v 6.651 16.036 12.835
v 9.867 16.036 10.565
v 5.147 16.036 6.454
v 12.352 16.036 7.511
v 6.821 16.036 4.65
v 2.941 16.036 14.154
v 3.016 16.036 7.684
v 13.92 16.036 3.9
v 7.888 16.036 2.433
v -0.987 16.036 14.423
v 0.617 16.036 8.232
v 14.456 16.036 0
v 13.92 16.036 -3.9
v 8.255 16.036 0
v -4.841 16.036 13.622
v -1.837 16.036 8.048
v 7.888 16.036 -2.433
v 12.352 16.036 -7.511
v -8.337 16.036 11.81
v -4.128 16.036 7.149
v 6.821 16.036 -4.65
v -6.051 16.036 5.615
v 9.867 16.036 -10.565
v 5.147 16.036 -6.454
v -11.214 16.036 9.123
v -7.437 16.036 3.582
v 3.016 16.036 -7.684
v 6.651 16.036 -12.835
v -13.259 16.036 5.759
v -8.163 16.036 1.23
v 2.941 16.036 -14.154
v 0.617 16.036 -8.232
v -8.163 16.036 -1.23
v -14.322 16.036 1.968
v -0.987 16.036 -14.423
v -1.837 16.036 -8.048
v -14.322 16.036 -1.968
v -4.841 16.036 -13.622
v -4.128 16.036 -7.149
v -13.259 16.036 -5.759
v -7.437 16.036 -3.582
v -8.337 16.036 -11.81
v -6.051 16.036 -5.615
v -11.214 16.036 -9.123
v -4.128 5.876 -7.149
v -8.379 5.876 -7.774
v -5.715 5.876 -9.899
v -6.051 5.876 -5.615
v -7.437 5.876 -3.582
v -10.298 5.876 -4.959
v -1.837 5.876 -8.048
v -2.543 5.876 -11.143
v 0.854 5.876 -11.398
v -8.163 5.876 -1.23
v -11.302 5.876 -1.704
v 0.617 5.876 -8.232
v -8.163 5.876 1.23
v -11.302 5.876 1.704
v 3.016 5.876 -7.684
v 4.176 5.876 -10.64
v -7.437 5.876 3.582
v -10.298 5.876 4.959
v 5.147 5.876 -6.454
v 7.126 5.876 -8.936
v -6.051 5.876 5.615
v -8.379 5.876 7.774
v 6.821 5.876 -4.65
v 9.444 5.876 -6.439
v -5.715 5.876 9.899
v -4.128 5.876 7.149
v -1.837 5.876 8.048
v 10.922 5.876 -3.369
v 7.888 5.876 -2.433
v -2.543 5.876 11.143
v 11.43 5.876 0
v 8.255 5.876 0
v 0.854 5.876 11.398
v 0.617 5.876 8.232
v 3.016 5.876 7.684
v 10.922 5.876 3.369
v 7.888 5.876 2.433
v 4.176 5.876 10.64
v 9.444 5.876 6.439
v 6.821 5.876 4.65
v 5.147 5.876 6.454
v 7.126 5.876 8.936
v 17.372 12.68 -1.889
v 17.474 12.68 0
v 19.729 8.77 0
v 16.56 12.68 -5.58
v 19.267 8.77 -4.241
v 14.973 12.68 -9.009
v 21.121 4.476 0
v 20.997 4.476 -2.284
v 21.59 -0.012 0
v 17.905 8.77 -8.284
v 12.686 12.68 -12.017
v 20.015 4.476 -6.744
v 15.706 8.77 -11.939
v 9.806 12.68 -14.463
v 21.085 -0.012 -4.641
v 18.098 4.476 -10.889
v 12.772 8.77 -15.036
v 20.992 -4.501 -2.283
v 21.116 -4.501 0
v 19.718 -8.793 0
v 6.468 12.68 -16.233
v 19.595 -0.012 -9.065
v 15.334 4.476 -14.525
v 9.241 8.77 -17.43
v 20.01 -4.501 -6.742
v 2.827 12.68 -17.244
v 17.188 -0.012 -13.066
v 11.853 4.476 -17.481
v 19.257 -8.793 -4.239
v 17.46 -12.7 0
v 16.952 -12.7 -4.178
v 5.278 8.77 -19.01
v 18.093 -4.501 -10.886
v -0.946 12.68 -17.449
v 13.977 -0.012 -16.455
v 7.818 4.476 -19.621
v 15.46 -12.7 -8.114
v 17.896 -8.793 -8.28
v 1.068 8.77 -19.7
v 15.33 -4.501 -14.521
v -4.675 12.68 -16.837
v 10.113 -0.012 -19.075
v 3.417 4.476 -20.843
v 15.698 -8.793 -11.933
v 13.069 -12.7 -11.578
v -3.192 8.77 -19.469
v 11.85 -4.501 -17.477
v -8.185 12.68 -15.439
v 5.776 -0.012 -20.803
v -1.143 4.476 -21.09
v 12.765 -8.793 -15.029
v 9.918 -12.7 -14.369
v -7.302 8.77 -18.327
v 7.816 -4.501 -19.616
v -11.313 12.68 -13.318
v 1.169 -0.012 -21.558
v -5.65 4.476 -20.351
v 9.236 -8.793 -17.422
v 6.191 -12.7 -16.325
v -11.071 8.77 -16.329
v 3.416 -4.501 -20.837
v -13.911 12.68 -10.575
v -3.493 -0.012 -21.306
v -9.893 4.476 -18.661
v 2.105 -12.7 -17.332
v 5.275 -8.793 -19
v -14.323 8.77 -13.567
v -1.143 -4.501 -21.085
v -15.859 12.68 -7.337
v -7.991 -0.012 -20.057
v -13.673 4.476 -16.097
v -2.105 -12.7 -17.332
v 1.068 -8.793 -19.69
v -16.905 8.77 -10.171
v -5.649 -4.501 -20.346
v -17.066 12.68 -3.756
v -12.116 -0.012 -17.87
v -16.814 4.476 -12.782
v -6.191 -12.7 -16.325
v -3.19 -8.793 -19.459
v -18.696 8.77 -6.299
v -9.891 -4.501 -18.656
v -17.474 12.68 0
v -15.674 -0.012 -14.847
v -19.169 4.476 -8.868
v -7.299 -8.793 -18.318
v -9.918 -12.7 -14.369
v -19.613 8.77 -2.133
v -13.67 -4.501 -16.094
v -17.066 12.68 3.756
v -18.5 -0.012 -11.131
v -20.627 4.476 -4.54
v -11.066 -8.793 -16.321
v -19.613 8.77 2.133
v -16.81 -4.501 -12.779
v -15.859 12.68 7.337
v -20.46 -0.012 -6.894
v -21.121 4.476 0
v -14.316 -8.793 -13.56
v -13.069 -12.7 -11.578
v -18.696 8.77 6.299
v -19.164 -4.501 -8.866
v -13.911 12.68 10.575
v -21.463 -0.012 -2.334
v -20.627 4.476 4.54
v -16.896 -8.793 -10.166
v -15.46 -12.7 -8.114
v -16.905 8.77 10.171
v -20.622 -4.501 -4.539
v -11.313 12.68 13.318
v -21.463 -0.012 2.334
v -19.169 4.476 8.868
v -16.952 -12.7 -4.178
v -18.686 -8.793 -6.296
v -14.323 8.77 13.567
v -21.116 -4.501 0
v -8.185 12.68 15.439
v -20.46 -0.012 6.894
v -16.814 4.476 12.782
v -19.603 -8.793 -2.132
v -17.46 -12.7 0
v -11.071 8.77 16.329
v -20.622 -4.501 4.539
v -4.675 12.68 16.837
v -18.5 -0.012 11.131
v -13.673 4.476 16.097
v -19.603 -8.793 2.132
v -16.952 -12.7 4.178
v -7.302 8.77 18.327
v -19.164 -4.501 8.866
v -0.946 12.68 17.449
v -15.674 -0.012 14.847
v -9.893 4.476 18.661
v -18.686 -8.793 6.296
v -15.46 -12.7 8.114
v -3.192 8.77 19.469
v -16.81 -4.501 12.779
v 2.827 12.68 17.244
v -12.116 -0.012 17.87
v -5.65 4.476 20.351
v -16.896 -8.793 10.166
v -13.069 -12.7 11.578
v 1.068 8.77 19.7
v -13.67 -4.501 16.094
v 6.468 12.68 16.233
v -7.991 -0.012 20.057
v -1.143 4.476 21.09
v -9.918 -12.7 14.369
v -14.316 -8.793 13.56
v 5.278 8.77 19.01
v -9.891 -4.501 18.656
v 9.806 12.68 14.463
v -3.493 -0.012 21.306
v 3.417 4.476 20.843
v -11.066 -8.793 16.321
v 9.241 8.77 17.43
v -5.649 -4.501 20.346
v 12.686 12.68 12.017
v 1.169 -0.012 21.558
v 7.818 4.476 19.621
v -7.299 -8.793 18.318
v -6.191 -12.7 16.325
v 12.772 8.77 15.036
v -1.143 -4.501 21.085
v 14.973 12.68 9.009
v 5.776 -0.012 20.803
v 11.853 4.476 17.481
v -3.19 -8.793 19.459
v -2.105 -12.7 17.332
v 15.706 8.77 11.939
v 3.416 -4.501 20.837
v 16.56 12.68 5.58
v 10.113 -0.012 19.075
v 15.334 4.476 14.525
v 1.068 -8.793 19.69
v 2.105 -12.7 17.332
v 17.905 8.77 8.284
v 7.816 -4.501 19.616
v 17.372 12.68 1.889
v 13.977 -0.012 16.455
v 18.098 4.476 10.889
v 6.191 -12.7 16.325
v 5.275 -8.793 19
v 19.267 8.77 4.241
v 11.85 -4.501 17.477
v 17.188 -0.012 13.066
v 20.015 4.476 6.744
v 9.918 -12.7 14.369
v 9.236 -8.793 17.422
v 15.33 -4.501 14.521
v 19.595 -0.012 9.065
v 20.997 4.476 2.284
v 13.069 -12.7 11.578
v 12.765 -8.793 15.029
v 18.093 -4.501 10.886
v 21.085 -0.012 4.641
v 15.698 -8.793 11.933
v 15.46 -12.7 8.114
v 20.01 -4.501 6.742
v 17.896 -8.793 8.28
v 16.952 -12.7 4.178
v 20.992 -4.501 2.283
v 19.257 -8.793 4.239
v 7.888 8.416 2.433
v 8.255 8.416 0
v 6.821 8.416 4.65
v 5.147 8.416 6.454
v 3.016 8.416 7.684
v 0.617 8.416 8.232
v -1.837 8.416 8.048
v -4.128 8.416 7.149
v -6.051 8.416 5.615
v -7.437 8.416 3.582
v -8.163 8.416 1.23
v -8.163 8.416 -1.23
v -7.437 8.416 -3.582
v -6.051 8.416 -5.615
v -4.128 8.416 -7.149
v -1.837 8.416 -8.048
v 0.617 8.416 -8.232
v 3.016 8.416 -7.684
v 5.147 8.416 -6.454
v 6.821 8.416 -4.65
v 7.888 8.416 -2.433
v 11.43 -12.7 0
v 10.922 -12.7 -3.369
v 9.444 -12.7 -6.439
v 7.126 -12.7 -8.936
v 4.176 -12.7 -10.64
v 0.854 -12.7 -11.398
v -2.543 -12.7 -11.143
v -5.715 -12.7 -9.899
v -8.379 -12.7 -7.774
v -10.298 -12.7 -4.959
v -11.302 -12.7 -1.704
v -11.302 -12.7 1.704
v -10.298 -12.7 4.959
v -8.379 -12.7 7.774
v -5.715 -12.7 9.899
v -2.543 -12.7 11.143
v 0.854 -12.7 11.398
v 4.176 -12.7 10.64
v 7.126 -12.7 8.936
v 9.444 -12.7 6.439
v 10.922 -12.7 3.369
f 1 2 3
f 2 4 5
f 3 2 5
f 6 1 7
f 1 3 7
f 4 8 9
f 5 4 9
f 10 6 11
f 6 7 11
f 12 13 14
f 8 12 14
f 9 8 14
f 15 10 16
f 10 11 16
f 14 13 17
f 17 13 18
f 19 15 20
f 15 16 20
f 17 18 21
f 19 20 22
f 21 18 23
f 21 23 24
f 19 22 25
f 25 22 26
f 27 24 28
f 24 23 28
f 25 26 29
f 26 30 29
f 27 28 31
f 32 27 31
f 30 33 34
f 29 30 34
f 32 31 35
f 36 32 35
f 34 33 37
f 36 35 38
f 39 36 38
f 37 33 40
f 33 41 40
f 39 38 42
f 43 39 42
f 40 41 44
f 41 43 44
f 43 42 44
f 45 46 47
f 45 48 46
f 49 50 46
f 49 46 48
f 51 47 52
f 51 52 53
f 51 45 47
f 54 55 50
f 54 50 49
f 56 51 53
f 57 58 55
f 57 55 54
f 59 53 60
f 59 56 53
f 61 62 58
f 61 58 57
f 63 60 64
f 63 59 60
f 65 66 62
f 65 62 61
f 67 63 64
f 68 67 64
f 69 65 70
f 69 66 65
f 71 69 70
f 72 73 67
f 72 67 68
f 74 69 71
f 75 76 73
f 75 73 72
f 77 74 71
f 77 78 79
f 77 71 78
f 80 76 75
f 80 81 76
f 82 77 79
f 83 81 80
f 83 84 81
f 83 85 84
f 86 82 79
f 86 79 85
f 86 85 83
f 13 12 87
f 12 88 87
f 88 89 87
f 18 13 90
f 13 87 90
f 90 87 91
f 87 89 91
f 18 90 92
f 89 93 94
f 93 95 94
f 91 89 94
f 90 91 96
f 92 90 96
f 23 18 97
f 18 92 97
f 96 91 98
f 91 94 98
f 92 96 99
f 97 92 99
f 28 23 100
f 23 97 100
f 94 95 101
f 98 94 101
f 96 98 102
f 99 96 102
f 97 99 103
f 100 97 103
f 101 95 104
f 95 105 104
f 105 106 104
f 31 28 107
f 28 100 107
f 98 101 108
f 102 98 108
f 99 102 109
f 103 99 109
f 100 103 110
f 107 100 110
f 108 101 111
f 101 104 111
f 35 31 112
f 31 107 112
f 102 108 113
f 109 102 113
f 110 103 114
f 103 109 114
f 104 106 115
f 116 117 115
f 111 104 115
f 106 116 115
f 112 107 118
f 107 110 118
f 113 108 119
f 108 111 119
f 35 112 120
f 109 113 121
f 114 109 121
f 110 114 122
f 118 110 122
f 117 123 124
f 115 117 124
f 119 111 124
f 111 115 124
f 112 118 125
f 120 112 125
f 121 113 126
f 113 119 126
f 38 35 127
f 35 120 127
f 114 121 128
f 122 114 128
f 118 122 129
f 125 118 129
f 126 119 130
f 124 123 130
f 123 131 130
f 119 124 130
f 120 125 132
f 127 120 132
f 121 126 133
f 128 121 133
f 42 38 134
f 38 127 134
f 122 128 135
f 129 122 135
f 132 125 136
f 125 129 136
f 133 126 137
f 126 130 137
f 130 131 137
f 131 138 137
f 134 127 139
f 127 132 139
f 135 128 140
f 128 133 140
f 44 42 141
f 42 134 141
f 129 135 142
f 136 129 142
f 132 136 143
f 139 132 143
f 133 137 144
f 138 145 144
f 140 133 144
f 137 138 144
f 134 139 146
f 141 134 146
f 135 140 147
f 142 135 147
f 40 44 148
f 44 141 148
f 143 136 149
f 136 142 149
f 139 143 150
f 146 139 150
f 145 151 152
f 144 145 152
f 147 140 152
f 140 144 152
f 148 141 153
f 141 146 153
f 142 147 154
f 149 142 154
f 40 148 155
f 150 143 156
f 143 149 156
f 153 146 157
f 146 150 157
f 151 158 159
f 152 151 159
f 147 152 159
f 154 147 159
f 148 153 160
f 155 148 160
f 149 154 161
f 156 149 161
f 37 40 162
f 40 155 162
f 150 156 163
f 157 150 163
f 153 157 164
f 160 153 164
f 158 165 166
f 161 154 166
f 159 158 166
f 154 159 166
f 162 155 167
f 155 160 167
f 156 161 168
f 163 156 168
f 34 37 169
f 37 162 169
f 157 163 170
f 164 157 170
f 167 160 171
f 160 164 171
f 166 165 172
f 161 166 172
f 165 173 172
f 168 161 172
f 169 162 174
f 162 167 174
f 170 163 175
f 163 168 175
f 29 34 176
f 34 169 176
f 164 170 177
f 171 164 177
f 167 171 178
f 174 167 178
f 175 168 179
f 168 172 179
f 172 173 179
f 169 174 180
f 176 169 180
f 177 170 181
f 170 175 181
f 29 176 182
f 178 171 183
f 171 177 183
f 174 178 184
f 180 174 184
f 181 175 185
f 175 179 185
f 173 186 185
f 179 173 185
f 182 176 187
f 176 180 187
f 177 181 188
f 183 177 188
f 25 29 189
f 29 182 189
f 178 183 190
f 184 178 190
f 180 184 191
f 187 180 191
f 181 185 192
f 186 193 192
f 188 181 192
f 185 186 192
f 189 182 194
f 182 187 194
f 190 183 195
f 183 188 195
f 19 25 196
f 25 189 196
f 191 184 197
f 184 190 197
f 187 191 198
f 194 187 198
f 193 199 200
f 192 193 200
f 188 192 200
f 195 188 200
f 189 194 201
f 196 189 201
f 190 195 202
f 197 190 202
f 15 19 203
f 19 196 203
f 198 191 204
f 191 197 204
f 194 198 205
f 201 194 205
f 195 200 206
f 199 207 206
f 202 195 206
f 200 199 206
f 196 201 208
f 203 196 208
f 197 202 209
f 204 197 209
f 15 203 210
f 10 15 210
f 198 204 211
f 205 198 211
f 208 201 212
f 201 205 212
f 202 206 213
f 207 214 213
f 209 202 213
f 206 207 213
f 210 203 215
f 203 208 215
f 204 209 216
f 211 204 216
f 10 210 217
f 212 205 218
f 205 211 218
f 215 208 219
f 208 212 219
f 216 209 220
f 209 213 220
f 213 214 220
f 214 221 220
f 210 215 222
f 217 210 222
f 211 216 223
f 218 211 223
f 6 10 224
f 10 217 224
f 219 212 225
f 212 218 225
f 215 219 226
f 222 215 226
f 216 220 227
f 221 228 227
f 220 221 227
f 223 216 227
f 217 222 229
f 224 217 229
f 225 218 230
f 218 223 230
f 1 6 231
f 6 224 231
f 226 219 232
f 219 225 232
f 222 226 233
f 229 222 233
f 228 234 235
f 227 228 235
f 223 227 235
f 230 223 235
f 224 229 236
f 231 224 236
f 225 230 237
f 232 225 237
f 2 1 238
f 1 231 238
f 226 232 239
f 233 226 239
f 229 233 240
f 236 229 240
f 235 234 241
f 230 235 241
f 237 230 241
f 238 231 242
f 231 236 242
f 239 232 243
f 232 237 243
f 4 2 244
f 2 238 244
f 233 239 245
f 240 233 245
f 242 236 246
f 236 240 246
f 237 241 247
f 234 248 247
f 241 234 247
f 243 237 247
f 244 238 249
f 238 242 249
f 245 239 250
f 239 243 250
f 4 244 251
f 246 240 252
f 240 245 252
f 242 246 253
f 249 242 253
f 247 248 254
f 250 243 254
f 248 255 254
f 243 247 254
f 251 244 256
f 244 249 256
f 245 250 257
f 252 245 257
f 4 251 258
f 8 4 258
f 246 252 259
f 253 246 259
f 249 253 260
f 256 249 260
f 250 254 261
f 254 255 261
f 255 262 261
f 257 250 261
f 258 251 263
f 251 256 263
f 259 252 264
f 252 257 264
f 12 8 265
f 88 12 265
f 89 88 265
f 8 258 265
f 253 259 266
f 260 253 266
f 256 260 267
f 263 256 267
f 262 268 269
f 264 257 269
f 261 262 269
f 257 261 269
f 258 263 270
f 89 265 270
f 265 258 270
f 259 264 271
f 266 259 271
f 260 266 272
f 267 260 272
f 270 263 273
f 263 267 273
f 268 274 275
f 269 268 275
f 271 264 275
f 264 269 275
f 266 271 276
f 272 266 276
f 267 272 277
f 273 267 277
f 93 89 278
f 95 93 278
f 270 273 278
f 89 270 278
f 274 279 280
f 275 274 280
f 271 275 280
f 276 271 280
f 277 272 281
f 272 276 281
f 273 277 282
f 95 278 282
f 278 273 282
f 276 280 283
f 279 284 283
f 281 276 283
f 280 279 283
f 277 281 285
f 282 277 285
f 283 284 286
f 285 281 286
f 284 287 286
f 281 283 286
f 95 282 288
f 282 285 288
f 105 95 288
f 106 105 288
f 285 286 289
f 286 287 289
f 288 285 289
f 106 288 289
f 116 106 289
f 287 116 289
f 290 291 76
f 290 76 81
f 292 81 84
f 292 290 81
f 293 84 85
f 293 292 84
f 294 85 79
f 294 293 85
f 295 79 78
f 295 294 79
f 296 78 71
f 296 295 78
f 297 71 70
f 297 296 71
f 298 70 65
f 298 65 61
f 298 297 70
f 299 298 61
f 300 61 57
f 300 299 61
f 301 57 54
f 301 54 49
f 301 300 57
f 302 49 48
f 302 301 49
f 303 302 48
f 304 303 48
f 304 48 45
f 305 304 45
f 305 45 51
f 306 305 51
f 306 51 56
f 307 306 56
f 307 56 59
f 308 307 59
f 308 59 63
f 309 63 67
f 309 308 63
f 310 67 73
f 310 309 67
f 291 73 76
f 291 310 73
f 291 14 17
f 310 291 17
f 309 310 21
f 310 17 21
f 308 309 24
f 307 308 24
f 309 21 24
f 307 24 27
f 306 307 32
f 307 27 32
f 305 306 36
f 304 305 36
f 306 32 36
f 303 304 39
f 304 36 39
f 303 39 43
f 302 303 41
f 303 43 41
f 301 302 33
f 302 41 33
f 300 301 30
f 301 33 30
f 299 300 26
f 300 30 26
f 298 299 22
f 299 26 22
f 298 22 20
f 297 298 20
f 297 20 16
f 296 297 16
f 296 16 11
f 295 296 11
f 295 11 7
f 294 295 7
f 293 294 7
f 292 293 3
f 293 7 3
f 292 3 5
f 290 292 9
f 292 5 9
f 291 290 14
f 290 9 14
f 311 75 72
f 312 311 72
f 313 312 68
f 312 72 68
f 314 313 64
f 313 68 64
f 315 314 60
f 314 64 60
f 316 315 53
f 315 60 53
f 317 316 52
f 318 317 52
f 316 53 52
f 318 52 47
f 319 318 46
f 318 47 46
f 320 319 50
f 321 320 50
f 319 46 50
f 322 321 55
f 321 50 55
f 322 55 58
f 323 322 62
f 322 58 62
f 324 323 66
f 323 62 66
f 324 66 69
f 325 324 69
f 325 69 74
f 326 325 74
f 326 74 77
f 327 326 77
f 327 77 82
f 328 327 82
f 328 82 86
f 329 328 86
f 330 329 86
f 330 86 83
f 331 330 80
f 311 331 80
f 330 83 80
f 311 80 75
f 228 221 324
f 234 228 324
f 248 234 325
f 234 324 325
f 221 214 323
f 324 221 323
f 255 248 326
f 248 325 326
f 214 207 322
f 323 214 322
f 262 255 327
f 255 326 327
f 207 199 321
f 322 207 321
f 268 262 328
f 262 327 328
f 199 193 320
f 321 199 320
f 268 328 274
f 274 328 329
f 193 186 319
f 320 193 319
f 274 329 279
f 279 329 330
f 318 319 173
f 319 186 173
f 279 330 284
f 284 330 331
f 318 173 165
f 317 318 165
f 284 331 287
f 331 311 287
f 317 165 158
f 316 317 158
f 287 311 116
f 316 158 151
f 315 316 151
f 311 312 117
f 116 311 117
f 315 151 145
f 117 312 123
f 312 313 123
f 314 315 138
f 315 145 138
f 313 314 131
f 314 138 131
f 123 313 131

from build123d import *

# Parameters (mm, degrees)
SKETCH3_R           = 11.43
SKETCH3_R_2         = 8.255
BOSS_EXTRUDE3_DEPTH = 2.54


with BuildPart() as part:
    # Sketch1 → Revolve1 (revolve)
    with BuildSketch(Plane.XY, mode=Mode.PRIVATE) as revolve1_sk:
        with BuildLine():
            Line((-8.255, 16.035758426), (-14.45622882, 16.035758426))
            ThreePointArc((-14.45622882, 16.035758426), (-21.473034234, 2.244304079), (-17.459613398, -12.7))
            Line((-17.459613398, -12.7), (-11.43, -12.7))
            Line((-11.43, -12.7), (-11.43, 8.415758426))
            Line((-11.43, 8.415758426), (-8.255, 8.415758426))
            Line((-8.255, 8.415758426), (-8.255, 16.035758426))
        make_face()
    revolve(revolve1_sk.sketch.rotate(Axis((0, 0, 0), (0, 1, 0)), 180), axis=Axis((0, 0, 0), (0, 1, 0)))

    # Sketch3 → Boss-Extrude3 (add)
    with BuildSketch(Plane.XZ.offset(-8.415758426)):
        Circle(SKETCH3_R)
        Circle(SKETCH3_R_2, mode=Mode.SUBTRACT)
    extrude(amount=BOSS_EXTRUDE3_DEPTH)


solid = part.part
